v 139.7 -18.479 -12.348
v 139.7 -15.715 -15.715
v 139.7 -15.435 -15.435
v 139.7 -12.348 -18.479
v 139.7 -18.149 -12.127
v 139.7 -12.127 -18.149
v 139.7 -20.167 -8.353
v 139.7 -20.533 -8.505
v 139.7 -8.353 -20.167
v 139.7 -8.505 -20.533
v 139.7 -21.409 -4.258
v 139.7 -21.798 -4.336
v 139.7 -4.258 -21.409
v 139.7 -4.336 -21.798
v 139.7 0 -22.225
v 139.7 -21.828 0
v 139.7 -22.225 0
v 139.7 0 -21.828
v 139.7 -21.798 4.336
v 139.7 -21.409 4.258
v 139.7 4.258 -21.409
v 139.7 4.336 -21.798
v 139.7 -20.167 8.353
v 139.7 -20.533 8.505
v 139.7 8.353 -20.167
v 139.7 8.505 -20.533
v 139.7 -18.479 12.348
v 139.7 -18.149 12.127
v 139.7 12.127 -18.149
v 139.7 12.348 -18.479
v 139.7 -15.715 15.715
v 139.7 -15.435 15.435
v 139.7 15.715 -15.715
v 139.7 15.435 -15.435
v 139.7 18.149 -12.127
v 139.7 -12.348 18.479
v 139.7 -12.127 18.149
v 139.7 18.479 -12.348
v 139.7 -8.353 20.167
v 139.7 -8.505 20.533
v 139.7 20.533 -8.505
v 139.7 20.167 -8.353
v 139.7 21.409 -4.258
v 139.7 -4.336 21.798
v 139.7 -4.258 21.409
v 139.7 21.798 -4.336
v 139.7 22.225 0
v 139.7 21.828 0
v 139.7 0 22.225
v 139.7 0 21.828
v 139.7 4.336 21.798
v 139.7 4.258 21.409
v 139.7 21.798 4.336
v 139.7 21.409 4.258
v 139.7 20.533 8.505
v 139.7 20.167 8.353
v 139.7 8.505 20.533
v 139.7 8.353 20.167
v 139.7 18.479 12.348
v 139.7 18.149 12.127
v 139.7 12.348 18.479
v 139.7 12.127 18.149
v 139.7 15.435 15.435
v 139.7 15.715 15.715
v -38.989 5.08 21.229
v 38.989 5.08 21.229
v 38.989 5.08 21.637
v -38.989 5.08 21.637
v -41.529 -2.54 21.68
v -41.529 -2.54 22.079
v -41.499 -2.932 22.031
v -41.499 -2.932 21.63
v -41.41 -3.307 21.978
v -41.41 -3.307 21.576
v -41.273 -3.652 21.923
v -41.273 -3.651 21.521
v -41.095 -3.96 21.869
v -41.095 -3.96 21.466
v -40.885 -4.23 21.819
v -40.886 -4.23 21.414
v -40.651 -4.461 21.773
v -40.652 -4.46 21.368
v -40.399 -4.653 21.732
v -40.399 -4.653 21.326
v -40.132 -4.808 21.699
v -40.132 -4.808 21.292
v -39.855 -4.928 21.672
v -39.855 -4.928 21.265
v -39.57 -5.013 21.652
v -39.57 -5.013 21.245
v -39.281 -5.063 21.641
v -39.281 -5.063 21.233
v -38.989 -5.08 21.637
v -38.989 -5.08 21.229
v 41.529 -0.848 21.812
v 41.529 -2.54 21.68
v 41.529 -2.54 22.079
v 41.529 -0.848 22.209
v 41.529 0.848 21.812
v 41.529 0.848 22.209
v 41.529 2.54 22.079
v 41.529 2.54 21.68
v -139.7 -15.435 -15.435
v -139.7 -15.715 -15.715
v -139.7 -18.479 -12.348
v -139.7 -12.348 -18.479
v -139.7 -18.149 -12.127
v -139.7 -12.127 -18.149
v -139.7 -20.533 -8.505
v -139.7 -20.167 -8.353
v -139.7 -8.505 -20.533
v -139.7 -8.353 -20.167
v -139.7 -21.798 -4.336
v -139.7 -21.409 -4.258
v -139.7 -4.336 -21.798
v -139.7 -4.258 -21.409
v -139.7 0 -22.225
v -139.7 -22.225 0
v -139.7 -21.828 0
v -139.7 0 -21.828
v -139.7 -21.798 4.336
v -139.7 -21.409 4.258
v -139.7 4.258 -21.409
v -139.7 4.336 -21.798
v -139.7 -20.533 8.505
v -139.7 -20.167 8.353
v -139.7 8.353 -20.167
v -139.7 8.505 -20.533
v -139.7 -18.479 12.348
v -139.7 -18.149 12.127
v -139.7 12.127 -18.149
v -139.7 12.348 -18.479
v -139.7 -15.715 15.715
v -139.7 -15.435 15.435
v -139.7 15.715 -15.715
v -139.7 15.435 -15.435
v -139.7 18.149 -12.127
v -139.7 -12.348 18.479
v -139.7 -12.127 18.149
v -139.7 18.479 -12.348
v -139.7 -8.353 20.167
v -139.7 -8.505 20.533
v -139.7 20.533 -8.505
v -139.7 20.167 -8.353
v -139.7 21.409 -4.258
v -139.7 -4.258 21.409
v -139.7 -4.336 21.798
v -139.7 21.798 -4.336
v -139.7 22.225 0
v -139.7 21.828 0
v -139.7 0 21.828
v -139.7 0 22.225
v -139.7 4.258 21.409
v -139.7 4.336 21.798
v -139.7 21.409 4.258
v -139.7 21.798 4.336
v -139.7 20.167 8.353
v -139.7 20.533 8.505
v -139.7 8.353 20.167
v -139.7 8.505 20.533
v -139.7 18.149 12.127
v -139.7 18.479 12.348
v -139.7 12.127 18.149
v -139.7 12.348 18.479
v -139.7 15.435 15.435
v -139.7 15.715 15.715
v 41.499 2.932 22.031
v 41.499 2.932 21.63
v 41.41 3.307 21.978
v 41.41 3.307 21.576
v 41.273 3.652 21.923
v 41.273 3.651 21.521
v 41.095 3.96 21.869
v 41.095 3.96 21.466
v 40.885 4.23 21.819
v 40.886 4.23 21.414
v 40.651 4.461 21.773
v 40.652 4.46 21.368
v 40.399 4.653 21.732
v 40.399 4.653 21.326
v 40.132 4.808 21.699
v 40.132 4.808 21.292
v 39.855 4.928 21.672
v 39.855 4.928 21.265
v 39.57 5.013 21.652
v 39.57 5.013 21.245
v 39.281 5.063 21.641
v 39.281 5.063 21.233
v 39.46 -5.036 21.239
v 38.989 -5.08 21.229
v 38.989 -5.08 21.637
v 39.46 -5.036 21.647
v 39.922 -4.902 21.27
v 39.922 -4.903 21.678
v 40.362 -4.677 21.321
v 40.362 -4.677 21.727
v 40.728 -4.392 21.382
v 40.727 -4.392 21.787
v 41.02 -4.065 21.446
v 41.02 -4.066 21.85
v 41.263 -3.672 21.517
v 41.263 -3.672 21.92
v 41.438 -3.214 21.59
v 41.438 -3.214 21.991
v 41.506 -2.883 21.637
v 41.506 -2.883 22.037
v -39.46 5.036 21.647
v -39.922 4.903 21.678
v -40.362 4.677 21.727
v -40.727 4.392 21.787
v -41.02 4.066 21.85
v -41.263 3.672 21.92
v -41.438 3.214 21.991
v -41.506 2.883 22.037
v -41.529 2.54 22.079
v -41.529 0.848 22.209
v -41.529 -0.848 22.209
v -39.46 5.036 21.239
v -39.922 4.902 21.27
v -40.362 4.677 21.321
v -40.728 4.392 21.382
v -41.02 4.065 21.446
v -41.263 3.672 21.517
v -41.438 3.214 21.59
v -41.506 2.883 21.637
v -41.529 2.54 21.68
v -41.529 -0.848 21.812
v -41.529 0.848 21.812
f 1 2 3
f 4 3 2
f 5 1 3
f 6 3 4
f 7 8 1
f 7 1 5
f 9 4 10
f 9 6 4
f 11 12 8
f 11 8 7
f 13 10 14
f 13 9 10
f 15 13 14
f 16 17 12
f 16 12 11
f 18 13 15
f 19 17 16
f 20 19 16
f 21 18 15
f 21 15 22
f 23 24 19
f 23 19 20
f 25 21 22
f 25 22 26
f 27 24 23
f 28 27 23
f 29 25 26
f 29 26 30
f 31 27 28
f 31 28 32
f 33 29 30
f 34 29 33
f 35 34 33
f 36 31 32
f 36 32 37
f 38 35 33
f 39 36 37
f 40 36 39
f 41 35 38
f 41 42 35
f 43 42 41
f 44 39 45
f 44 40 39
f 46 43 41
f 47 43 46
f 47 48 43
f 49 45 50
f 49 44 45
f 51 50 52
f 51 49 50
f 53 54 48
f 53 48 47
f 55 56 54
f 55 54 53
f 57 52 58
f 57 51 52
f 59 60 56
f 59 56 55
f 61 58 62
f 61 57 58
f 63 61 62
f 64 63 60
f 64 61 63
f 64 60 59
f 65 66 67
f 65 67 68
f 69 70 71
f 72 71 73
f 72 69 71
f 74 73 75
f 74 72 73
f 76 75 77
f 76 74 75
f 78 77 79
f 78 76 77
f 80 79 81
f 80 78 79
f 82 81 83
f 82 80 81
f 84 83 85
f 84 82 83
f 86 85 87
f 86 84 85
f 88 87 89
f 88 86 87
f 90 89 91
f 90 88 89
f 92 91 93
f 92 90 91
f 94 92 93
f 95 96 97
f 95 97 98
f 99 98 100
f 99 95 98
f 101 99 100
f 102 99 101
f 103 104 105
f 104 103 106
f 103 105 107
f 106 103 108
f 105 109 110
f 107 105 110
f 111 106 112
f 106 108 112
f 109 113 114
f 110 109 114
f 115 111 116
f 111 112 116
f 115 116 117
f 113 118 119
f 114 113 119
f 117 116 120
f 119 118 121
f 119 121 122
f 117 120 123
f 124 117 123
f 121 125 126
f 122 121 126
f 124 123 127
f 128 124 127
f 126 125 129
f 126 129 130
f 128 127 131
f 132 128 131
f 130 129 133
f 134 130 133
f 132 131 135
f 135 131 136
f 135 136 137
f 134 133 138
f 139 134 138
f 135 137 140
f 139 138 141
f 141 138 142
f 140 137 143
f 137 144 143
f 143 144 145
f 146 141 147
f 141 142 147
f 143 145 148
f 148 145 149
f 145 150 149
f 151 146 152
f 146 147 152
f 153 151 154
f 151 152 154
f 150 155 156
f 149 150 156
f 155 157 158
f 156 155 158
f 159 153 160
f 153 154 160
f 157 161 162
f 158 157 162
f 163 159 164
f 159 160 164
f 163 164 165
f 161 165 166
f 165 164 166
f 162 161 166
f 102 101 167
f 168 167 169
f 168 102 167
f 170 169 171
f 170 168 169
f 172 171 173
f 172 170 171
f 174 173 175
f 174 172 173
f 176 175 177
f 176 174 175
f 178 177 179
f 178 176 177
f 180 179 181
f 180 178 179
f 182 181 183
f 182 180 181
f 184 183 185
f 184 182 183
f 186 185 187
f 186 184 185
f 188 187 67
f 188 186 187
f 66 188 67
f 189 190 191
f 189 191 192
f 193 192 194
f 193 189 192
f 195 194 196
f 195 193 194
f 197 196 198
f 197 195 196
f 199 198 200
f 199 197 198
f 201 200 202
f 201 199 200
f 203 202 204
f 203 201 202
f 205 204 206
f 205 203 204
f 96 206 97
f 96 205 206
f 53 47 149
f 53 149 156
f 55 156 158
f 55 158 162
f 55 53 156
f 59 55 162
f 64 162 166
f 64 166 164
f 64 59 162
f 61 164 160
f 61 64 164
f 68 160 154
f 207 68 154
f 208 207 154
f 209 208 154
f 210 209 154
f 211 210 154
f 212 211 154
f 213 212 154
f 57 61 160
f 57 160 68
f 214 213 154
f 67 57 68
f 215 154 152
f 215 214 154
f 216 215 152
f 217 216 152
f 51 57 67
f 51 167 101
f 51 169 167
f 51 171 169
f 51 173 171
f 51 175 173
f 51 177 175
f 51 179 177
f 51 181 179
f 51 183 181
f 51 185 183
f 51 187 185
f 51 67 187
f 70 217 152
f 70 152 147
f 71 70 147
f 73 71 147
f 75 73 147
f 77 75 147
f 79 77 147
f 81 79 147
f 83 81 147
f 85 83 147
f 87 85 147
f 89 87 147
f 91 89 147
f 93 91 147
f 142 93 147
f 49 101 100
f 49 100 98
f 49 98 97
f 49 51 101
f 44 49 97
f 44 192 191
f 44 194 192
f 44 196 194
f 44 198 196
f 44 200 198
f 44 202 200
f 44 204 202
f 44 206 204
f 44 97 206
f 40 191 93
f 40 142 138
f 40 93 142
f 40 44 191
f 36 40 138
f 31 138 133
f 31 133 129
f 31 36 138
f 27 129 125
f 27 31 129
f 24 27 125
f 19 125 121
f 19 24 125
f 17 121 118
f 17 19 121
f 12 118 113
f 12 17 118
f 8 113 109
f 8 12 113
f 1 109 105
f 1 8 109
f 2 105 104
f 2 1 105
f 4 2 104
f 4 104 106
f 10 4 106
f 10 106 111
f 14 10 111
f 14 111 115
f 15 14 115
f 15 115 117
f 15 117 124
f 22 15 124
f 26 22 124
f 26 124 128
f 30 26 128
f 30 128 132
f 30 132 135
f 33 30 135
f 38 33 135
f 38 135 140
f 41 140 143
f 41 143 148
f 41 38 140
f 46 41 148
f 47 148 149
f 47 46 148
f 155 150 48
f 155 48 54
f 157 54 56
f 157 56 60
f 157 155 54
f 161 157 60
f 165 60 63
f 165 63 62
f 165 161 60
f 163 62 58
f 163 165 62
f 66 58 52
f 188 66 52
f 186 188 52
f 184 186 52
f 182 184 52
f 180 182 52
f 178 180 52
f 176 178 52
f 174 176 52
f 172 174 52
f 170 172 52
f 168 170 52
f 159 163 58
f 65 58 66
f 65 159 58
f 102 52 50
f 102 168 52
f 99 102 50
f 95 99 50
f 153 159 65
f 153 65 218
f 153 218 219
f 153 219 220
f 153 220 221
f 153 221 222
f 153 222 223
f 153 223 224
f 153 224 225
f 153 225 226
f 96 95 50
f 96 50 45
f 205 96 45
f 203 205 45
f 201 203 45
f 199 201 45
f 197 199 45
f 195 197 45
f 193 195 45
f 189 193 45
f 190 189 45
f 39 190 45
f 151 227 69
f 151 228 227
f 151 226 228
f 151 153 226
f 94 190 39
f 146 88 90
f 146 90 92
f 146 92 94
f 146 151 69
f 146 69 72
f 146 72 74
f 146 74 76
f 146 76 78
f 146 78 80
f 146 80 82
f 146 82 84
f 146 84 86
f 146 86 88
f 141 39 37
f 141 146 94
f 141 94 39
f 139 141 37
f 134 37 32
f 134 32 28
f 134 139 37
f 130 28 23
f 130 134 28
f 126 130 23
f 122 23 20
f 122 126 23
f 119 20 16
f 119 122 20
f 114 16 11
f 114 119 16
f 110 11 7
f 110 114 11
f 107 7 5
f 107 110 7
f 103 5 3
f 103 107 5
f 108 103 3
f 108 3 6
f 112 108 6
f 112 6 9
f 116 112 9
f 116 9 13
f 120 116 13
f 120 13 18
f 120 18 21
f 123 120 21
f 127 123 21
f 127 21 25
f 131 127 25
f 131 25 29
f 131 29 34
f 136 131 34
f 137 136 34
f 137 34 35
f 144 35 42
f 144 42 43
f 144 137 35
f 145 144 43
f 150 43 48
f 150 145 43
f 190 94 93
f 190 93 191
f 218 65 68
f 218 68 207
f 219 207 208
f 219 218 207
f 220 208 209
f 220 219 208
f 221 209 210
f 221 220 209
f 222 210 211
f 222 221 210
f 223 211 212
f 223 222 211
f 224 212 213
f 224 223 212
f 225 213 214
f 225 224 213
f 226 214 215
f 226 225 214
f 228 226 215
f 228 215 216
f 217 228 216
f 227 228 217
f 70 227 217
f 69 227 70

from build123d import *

# Parameters (mm, degrees)
F0_R     = 22.225
F0_R_2   = 21.828125
F1_DEPTH = 139.7
F3_DEPTH = 25.4


with BuildPart() as f1:
    # F0 (on Right) → F1 (new body, symmetric)
    with BuildSketch(Plane.YZ):
        Circle(F0_R)
        Circle(F0_R_2, mode=Mode.SUBTRACT)
    extrude(amount=F1_DEPTH, both=True)

    # F2 (on Top) → F3 (cut)
    with BuildSketch(Plane.XY):
        with BuildLine():
            Line((38.989, 5.08), (-38.989, 5.08))
            ThreePointArc((-38.989, 5.08), (-40.785051, 4.336051), (-41.529, 2.54))
            Line((-41.529, 2.54), (-41.529, -2.54))
            ThreePointArc((-41.529, -2.54), (-40.785051, -4.336051), (-38.989, -5.08))
            Line((-38.989, -5.08), (38.989, -5.08))
            ThreePointArc((38.989, -5.08), (40.785051, -4.336051), (41.529, -2.54))
            Line((41.529, -2.54), (41.529, 2.54))
            ThreePointArc((41.529, 2.54), (40.785051, 4.336051), (38.989, 5.08))
        make_face()
    extrude(amount=F3_DEPTH, mode=Mode.SUBTRACT)


solid = f1.part
